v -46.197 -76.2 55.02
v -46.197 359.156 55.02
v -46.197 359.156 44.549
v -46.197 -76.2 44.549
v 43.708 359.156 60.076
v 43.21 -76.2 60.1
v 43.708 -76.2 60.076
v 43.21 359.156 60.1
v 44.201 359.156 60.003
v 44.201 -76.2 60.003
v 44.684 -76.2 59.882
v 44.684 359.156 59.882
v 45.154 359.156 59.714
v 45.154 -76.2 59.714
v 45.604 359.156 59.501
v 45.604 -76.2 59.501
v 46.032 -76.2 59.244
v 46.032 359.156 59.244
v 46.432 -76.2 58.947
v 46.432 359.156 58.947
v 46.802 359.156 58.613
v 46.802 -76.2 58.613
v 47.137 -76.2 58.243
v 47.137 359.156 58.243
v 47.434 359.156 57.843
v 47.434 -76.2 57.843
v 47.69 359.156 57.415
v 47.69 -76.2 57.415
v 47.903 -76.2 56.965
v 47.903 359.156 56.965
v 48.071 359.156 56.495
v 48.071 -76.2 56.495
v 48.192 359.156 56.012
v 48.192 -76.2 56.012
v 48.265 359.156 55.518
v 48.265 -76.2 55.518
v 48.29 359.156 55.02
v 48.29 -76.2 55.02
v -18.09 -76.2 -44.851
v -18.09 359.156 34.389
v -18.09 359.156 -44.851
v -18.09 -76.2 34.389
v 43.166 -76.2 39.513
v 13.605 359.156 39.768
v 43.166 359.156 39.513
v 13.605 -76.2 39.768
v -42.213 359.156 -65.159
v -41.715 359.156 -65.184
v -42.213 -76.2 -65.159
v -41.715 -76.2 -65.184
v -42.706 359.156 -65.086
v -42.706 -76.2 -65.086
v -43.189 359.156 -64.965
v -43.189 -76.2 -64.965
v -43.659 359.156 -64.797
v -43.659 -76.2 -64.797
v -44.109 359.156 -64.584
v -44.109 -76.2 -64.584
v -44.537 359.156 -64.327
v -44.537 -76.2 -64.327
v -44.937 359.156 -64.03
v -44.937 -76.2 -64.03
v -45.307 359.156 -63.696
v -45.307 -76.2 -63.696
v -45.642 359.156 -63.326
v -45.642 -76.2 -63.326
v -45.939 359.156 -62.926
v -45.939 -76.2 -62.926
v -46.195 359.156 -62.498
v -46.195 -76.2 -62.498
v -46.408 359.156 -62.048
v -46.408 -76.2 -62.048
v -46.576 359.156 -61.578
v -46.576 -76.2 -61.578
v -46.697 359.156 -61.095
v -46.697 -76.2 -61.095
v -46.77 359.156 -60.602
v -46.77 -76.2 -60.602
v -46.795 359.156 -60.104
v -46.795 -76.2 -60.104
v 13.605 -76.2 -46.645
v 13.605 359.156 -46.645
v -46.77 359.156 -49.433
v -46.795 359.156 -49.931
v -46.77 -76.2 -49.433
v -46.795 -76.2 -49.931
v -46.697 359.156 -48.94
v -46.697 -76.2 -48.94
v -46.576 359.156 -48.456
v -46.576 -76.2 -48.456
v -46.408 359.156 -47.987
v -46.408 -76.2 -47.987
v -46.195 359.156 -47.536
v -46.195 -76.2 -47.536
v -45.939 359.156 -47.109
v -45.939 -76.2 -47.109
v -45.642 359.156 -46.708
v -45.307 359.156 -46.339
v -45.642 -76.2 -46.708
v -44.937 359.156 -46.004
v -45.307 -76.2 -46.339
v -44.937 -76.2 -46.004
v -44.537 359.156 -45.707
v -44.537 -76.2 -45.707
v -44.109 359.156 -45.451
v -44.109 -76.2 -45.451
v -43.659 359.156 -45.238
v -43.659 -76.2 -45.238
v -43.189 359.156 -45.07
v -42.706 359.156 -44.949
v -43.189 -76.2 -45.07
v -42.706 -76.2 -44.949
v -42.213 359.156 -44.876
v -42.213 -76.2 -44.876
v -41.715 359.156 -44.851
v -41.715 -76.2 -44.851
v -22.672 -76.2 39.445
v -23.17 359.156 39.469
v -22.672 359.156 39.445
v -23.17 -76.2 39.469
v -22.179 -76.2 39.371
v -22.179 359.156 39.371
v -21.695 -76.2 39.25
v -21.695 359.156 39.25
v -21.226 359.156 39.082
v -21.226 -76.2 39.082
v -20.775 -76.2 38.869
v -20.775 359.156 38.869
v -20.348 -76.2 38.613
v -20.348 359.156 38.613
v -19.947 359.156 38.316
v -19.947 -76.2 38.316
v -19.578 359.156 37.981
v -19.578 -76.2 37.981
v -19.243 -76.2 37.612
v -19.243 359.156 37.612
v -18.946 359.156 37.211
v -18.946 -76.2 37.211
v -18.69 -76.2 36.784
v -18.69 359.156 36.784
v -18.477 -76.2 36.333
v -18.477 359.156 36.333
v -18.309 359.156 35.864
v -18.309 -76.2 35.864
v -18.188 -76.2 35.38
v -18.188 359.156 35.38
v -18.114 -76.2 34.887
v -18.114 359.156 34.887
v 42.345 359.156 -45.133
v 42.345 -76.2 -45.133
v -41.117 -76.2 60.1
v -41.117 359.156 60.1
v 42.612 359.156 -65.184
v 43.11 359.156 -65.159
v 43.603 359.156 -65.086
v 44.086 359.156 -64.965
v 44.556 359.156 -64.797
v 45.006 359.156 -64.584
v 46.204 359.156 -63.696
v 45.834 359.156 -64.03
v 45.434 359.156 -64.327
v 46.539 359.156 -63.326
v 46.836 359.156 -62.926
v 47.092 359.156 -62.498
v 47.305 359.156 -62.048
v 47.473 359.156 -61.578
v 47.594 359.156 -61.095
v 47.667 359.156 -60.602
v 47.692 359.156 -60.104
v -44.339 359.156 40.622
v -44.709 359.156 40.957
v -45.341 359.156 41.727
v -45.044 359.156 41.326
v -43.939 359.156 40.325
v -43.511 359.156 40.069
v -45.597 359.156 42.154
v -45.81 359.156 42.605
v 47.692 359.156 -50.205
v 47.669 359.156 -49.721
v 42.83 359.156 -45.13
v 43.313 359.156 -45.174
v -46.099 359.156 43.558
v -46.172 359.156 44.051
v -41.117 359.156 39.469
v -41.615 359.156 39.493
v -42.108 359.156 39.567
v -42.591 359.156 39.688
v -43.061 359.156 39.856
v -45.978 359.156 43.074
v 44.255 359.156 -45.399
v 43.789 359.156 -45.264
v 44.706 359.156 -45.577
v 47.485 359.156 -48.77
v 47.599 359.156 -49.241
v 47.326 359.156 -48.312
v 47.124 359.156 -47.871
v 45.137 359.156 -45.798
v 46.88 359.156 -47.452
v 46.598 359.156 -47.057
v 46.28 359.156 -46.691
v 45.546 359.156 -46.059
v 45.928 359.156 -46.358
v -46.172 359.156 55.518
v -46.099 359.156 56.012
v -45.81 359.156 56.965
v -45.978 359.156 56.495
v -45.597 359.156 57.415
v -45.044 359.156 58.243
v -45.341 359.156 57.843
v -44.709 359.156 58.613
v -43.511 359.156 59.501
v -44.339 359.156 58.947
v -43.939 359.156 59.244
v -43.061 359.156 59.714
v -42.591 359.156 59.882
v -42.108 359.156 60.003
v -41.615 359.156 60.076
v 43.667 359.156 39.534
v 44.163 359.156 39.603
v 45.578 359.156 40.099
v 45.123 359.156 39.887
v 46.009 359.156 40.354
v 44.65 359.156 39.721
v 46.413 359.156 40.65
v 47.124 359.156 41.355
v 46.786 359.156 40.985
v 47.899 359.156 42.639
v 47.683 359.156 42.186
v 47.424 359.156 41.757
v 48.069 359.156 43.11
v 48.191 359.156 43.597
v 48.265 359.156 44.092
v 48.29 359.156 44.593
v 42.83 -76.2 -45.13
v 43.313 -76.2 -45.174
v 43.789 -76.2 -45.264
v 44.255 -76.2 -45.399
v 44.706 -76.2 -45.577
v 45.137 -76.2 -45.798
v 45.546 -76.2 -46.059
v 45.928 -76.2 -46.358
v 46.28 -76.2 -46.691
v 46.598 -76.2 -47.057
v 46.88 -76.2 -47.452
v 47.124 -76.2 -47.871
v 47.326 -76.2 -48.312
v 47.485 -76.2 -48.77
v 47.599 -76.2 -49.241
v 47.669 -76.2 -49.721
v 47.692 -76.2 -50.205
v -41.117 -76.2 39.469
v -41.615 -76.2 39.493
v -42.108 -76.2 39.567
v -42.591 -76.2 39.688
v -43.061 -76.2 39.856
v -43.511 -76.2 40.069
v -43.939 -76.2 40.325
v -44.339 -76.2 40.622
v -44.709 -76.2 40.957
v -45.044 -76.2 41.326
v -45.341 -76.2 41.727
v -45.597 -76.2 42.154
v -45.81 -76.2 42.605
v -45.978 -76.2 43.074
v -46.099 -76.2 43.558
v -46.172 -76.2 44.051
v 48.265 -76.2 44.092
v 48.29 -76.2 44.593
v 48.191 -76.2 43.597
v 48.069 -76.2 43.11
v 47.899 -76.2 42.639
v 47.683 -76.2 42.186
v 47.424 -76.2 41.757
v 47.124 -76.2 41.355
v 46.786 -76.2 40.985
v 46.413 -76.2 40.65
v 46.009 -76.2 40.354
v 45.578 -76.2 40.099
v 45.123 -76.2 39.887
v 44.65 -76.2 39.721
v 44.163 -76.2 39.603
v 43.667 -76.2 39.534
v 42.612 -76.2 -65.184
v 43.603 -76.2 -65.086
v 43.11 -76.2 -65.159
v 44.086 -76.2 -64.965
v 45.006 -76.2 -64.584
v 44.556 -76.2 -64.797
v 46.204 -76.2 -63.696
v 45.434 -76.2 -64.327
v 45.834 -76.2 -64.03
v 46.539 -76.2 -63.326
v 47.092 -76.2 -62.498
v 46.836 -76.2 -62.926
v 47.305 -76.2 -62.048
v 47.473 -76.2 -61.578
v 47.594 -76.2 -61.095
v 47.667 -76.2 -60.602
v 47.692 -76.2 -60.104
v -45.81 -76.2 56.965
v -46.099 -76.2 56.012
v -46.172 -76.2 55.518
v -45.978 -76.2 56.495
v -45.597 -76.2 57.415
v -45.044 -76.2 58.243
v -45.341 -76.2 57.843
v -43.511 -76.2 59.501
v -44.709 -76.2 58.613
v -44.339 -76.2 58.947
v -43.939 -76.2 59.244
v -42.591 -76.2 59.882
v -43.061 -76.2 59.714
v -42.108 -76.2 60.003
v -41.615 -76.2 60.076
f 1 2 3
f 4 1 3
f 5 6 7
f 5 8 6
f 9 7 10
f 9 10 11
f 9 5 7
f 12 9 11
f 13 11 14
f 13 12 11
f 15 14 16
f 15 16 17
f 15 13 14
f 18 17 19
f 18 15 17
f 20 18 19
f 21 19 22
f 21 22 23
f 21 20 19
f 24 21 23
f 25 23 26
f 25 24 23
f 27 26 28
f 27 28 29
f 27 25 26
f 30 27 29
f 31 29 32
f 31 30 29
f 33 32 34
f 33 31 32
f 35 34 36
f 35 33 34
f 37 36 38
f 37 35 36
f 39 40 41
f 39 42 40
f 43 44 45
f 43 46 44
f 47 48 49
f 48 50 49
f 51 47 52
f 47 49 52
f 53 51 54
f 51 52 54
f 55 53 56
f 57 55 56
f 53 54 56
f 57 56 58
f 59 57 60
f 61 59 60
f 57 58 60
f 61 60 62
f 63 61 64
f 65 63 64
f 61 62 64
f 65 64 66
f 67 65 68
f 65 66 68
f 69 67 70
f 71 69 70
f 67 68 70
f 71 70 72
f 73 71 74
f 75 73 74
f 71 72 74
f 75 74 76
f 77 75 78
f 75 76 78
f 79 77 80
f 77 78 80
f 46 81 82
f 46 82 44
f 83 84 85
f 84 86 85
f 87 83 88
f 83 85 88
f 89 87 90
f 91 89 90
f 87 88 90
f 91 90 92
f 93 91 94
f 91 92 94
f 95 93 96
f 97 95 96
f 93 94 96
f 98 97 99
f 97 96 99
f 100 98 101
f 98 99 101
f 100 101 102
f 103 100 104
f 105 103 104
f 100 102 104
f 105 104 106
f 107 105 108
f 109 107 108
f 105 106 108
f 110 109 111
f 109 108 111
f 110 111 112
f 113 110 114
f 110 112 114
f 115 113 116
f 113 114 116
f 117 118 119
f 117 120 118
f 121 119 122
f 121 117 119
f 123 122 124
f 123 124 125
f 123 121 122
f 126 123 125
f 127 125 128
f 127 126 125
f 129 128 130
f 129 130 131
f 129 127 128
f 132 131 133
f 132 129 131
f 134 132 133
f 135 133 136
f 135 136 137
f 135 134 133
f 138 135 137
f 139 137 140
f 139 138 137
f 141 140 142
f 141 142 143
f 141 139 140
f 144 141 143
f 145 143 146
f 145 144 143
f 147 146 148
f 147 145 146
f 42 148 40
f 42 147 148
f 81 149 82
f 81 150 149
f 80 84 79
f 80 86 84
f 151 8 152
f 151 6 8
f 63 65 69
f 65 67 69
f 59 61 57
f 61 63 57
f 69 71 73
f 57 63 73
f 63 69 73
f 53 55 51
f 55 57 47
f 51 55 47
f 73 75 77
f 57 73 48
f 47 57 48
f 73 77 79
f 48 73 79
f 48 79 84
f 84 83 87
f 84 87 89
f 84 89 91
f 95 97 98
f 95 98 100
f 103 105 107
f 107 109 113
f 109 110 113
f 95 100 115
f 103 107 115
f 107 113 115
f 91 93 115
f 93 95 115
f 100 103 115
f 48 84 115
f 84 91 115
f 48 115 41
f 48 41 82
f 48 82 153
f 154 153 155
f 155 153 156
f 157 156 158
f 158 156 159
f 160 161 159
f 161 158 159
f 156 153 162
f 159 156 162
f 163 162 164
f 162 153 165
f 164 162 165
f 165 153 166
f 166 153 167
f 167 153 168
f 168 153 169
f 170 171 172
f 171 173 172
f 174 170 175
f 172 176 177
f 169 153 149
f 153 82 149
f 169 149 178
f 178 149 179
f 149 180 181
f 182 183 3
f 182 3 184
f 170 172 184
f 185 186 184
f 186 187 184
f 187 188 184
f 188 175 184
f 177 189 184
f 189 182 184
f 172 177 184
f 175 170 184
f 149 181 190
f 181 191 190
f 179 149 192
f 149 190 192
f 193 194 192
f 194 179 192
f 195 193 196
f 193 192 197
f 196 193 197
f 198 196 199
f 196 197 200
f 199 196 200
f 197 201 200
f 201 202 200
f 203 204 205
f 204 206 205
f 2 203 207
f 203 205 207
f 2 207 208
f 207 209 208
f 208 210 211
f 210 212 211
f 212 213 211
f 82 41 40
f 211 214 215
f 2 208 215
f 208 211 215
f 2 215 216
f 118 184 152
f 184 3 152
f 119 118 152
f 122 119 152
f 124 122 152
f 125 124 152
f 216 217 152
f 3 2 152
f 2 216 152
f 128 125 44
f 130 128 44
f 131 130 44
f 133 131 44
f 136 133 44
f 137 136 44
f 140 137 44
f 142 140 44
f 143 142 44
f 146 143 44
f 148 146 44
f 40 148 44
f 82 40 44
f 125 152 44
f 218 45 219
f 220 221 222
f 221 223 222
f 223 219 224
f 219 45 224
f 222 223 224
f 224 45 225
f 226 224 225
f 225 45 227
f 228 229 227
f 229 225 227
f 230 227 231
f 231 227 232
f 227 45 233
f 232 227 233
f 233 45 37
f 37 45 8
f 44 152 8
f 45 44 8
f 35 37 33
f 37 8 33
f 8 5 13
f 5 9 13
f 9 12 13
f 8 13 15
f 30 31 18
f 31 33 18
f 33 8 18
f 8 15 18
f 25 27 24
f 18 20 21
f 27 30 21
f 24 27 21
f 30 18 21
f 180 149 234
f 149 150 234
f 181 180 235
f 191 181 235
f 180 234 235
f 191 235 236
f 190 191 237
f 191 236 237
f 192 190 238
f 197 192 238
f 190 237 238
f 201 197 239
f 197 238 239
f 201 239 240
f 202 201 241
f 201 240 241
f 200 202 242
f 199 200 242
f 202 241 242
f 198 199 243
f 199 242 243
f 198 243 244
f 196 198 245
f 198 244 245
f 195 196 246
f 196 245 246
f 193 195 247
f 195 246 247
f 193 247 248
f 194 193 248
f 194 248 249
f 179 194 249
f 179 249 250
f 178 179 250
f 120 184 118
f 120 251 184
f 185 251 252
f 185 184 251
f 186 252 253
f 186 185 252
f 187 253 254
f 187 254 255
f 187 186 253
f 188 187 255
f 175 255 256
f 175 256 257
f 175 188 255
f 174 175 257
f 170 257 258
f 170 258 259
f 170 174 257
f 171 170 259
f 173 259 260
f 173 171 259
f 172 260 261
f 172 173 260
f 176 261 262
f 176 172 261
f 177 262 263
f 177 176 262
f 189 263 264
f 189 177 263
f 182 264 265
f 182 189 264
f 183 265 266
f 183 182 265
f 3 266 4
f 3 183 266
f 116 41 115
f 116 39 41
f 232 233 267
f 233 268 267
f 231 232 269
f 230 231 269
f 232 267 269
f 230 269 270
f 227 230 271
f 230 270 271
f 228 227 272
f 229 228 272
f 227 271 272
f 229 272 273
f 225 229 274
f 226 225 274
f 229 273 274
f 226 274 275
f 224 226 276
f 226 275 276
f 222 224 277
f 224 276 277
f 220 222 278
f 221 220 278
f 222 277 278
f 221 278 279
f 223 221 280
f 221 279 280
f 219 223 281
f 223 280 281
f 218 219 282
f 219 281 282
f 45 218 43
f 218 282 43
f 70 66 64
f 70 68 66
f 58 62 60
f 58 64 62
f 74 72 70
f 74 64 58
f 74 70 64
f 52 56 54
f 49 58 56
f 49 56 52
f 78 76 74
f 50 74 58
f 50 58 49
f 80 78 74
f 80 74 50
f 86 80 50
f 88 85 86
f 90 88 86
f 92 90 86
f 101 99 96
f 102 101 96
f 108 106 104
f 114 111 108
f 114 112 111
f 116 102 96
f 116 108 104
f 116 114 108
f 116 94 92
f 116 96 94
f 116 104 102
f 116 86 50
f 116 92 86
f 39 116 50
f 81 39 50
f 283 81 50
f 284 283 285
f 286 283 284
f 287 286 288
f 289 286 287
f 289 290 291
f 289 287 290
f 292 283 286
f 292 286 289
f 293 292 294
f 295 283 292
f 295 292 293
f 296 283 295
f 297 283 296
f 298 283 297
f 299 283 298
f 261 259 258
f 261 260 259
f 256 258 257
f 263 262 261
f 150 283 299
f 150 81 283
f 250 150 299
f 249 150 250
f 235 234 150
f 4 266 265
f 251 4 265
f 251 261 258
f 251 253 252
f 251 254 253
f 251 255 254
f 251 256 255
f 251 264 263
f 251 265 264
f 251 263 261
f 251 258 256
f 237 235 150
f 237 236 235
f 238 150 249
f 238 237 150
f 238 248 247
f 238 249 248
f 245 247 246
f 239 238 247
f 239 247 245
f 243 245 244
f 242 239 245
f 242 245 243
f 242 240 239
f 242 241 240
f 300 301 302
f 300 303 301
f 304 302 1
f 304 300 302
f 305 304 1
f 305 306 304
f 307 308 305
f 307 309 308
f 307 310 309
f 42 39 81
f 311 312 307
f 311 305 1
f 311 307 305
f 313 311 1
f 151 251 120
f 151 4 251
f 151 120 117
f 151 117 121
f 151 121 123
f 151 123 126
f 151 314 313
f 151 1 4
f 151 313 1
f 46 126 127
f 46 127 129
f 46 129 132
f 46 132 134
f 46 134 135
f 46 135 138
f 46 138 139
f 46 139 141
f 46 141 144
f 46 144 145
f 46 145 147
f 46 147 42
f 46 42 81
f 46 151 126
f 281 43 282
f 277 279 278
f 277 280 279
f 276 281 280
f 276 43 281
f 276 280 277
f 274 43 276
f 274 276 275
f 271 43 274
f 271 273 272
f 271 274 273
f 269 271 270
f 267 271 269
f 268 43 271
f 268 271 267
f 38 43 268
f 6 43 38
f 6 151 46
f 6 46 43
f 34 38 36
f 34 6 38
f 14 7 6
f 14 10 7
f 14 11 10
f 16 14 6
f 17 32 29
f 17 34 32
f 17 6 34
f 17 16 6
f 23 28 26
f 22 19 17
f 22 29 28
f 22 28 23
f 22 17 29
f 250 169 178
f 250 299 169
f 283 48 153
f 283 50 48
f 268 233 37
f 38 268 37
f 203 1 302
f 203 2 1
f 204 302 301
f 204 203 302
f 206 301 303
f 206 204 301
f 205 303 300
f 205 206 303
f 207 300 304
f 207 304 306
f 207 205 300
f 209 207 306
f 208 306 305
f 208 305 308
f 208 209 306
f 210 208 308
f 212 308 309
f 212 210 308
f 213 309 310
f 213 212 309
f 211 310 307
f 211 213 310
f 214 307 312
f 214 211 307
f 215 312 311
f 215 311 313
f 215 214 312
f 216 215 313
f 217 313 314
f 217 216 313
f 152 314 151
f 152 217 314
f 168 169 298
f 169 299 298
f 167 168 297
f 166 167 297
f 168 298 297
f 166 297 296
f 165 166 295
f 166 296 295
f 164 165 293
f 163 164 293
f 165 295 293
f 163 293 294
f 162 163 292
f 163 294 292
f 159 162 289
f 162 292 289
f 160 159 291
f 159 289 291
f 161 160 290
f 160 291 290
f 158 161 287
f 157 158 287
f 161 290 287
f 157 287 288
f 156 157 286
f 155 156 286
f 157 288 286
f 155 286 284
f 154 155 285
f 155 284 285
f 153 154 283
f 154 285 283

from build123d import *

# Parameters (mm, degrees)
F1_DEPTH = 76.2
F2_DEPTH = 150.114
F3_DEPTH = 209.042
F4_R     = 5.08


with BuildPart() as f1:
    # F0 (on Front) → F1 (new body)
    with BuildSketch(Plane.XZ):
        Polygon((-46.1966358125, 39.4689701498), (-18.0899463594, 39.4689701498), (-18.0899463594, -44.8510982096), (-46.7946529388, -44.8510982096), (-46.7946529388, -65.1835948229), (47.6916655898, -65.1835948229), (47.6916655898, -44.8510982096), (13.6048318818, -46.645142138), (13.6048318818, 39.7679805756), (48.2896827161, 39.4689701498), (48.2896827161, 60.1004771888), (-46.1966358125, 60.1004771888), align=None)
    extrude(amount=F1_DEPTH)

    # F2 (add): a face of the model
    f2_faces = [f1.faces().sort_by_distance(p)[0] for p in [
        (-0.6124565999, 0, -2.2518569058),
    ]]
    extrude(f2_faces, amount=F2_DEPTH)

    # F3 (add): a face of the model
    f3_faces = [f1.faces().sort_by_distance(p)[0] for p in [
        (-0.6124565999, 150.114, -2.2518569058),
    ]]
    extrude(f3_faces, amount=F3_DEPTH)

    # F4
    f4_edges = [f1.edges().sort_by_distance(p)[0] for p in [
        (-46.196636, 141.478, 39.46897),
        (-18.089946, 141.478, 39.46897),
        (-46.794653, 141.478, -44.851098),
        (-46.794653, 141.478, -65.183595),
        (47.691666, 141.478, -65.183595),
        (47.691666, 141.478, -44.851098),
        (48.289683, 141.478, 39.46897),
        (48.289683, 141.478, 60.100477),
        (-46.196636, 141.478, 60.100477),
    ]]
    fillet(f4_edges, radius=F4_R)


solid = f1.part
